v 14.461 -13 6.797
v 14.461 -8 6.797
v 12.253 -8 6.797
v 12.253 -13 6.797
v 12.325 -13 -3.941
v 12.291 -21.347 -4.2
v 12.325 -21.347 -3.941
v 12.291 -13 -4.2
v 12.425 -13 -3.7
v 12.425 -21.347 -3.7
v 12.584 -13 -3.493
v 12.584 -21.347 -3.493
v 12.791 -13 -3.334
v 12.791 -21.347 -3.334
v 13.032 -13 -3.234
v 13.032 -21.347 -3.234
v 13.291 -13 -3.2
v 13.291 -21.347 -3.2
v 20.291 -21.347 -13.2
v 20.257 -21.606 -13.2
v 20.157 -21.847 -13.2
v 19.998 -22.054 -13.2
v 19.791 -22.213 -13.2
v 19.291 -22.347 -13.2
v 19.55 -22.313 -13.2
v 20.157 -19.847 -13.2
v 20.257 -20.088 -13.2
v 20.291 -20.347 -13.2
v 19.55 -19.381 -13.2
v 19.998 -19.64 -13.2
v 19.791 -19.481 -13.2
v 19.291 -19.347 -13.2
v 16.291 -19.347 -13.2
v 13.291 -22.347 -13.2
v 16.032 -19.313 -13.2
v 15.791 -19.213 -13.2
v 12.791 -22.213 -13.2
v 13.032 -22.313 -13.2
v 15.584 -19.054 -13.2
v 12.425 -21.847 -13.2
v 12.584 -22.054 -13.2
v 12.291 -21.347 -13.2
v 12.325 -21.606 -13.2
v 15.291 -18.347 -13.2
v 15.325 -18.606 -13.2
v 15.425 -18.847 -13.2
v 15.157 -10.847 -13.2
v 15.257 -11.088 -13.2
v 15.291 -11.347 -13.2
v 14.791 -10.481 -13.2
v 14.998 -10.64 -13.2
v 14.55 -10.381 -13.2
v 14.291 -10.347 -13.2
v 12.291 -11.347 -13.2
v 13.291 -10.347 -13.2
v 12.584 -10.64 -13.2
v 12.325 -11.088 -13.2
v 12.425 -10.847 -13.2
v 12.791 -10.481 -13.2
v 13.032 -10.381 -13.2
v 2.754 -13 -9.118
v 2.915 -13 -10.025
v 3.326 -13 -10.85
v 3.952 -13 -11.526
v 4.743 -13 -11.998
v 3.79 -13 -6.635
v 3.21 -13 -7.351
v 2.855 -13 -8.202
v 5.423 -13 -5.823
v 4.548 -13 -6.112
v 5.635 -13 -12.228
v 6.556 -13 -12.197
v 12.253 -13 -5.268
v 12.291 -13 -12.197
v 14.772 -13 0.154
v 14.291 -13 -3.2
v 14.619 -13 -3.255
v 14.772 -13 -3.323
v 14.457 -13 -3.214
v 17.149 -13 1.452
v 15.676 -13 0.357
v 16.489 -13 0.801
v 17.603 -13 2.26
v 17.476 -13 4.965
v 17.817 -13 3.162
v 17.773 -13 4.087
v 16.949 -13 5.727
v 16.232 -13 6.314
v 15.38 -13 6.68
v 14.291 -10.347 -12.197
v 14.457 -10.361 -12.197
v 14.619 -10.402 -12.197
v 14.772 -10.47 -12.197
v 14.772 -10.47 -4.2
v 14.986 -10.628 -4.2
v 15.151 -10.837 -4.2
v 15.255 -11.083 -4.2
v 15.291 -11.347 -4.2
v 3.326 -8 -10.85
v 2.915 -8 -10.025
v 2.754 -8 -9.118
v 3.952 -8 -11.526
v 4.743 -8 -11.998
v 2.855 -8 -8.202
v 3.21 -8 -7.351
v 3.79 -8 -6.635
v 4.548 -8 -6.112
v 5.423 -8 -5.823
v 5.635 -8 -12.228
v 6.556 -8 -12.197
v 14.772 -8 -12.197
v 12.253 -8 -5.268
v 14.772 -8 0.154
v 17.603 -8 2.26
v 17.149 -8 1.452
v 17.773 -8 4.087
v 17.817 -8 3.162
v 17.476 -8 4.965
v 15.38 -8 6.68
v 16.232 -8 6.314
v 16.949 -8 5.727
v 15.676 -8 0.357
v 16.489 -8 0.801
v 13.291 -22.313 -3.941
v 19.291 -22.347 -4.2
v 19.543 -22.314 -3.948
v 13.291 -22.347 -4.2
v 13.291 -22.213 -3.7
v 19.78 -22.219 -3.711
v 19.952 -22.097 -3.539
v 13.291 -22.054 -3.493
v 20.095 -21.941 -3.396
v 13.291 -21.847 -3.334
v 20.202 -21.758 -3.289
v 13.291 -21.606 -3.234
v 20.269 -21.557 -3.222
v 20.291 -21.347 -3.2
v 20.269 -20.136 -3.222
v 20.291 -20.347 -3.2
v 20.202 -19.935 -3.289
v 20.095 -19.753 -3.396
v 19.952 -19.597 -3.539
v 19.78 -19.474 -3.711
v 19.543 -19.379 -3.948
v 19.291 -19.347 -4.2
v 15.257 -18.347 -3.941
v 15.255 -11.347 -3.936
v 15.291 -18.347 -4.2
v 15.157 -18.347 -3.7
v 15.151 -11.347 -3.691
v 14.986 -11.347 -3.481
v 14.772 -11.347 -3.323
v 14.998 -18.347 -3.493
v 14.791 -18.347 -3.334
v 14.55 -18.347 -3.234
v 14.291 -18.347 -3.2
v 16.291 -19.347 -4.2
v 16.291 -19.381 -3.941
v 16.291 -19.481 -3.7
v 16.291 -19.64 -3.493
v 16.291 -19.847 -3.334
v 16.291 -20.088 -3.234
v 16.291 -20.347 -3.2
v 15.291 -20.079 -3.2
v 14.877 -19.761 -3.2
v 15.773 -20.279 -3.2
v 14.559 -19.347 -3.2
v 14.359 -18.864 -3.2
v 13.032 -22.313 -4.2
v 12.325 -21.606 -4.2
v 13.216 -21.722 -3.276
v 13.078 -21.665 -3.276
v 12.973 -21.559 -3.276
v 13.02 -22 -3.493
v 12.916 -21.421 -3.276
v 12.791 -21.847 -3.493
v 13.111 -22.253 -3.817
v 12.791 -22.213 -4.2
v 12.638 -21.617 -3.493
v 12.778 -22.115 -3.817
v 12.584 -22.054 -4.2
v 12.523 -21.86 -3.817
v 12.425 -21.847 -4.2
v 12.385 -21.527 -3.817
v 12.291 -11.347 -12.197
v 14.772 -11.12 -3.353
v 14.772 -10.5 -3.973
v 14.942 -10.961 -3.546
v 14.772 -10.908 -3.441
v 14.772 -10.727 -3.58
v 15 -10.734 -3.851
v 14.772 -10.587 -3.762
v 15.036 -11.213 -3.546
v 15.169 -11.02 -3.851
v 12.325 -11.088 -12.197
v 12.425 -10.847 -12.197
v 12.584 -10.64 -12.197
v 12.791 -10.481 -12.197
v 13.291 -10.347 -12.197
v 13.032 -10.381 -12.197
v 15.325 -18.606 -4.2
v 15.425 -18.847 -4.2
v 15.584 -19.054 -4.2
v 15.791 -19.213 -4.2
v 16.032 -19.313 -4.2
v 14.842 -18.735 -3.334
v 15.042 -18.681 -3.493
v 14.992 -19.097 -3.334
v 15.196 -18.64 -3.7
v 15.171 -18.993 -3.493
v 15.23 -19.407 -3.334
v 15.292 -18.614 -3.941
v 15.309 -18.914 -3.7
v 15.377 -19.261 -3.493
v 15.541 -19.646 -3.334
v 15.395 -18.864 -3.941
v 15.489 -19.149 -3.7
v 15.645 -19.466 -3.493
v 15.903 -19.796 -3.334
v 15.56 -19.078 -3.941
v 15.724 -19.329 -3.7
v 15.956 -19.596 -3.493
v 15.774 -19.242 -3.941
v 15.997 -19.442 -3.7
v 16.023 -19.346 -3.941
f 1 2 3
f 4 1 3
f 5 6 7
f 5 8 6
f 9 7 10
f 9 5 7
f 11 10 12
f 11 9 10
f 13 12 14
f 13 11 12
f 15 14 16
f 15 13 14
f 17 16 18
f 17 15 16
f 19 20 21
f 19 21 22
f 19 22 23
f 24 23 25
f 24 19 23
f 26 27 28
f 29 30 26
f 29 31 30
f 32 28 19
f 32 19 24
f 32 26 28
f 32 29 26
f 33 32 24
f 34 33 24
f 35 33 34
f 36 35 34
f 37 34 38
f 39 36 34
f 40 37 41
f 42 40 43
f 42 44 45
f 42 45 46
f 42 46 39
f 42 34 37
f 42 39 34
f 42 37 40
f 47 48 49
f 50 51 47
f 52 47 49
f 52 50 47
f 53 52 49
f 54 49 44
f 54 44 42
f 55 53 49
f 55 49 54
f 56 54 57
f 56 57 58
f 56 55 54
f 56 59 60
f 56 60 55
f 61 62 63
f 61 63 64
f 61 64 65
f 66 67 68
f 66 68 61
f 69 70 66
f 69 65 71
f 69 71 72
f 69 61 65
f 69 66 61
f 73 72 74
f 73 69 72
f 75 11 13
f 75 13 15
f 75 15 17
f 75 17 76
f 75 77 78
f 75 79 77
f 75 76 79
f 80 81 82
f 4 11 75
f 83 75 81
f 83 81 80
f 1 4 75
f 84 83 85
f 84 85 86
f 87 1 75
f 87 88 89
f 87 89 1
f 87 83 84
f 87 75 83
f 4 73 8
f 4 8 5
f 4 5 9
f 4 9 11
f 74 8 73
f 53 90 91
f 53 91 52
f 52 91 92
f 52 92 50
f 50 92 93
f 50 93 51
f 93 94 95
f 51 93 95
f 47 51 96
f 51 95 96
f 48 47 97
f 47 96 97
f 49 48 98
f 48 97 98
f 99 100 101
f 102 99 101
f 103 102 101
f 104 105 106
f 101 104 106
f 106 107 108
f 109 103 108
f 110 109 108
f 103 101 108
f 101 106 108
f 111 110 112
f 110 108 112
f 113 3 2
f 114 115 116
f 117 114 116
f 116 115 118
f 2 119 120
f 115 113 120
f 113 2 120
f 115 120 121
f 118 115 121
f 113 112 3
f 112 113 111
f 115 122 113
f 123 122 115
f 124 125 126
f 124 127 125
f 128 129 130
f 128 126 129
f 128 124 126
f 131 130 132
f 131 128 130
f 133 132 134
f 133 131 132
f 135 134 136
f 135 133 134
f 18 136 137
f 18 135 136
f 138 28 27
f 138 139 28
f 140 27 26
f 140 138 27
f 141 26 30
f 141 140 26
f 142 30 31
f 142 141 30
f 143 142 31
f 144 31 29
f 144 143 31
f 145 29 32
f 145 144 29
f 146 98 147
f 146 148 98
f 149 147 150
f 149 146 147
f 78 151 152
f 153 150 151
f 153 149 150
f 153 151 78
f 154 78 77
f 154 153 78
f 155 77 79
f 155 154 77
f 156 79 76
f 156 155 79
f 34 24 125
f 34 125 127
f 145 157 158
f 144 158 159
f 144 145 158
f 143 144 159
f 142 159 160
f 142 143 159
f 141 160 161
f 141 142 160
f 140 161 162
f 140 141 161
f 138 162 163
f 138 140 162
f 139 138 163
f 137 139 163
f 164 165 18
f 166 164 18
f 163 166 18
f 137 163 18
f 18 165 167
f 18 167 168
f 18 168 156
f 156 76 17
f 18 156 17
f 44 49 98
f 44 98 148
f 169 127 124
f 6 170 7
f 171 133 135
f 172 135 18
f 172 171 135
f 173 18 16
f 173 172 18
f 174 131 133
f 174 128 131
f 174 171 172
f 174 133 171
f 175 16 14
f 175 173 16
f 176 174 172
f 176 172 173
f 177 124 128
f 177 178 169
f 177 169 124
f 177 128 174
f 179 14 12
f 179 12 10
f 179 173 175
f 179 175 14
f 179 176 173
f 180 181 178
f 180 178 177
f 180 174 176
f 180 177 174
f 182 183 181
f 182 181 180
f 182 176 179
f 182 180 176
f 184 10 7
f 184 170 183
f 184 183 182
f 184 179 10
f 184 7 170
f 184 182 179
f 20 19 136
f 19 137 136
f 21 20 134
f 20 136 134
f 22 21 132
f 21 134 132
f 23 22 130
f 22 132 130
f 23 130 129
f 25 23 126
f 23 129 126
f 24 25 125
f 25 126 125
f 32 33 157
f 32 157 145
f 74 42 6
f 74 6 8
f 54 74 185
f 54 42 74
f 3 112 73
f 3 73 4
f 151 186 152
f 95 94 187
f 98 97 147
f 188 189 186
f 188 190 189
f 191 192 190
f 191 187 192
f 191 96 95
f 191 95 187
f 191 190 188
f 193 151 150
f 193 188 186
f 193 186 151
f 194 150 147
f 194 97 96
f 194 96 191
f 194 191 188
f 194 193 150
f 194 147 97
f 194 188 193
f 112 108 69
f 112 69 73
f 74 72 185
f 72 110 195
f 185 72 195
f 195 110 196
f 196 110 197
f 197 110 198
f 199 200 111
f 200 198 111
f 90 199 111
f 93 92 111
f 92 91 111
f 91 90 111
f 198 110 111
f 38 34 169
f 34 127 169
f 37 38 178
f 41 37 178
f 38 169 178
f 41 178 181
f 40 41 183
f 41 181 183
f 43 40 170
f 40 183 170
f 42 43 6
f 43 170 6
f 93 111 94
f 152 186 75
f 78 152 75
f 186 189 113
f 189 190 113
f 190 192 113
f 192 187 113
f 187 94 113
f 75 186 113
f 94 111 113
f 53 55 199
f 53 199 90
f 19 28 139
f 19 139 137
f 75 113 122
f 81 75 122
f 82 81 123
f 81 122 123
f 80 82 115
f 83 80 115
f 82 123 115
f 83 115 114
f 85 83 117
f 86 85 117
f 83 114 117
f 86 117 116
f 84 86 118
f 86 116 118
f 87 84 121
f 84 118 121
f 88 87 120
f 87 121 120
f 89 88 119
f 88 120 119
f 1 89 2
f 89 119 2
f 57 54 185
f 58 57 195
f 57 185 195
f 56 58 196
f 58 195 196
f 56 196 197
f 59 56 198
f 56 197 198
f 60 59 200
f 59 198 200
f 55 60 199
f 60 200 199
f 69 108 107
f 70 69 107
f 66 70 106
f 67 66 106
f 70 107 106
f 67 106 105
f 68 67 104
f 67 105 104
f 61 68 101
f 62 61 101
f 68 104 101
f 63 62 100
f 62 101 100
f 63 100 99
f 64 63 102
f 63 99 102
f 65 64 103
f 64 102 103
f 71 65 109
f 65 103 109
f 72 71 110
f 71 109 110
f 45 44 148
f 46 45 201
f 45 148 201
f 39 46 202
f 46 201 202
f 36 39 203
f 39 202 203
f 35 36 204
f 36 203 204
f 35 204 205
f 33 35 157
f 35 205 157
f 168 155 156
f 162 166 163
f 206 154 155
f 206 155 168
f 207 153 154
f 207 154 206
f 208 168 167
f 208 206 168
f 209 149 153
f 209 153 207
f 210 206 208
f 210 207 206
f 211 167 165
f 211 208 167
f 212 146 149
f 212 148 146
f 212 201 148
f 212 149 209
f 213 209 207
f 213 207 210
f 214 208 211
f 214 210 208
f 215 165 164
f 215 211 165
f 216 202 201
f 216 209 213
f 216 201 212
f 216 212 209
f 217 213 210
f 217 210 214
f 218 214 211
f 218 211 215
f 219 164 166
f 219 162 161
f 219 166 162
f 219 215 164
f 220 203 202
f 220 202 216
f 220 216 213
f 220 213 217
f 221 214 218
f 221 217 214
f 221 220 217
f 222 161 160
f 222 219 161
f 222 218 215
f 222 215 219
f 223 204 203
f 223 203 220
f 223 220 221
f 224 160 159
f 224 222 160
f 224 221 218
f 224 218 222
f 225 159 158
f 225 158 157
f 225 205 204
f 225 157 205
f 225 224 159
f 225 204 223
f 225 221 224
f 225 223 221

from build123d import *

# Parameters (mm, degrees)
EXTRUDE004_DEPTH = 5
EXTRUDE003_DEPTH = 10
FILLET021_R      = 1


with BuildPart() as extrude004:
    # Sketch006 → Extrude004 (new body)
    with BuildSketch(Plane.XZ):
        with BuildLine():
            ThreePointArc((14.771842, 0.154152), (17.827348, 3.62591), (14.461083, 6.797264))
            Line((14.461083, 6.797264), (12.252875, 6.797264))
            Line((12.252875, -5.267611), (12.252875, 6.797264))
            Line((5.422805, -5.82309), (12.252875, -5.267611))
            ThreePointArc((5.422805, -5.82309), (2.802341, -9.576998), (6.556249, -12.197462))
            Line((6.556249, -12.197462), (14.771842, -12.197462))
            Line((14.771842, -12.197462), (14.771842, 0.154152))
        make_face()
    extrude(amount=EXTRUDE004_DEPTH)


with BuildPart() as extrude004_1:
    # Extrude004 placement: moved
    add(extrude004.part.moved(Location((0, -8, 0))))


with BuildPart() as fillet021:
    # Sketch005 → Extrude003 (new body)
    with BuildSketch(Plane.XY):
        Polygon((57.709053, -19.346786), (57.709053, -22.346786), (65.709053, -22.346786), (65.709053, -10.346786), (62.709053, -10.346786), (62.709053, -19.346786), align=None)
    extrude(amount=EXTRUDE003_DEPTH)


with BuildPart() as fillet021_1:
    # Extrude003 placement: moved
    add(fillet021.part.moved(Location((0, 0, -14))))

    # Fillet021
    fillet021_edges = [fillet021_1.edges().sort_by_distance(p)[0] for p in [
        (57.709053, -19.346786, -9),
        (57.709053, -22.346786, -9),
        (65.709053, -22.346786, -9),
        (61.709053, -22.346786, -4),
        (65.709053, -10.346786, -9),
        (65.709053, -16.346786, -4),
        (62.709053, -10.346786, -9),
        (64.209053, -10.346786, -4),
        (62.709053, -19.346786, -9),
        (62.709053, -14.846786, -4),
        (60.209053, -19.346786, -4),
    ]]
    fillet(fillet021_edges, radius=FILLET021_R)


with BuildPart() as fillet021_2:
    # Fillet021 placement: moved
    add(fillet021_1.part.moved(Location((0, 0, 0.4))))


with BuildPart() as c4holds002:
    # Part__Mirroring005: instance of Fillet021
    add(fillet021_2.part.mirror(Plane(origin=(0, 0, 0), x_dir=(0, -1, 0), z_dir=(1, 0, 0))))


with BuildPart() as c4holds002_1:
    # Part__Mirroring005 placement: moved
    add(c4holds002.part.moved(Location((78, 0, 0.4))))

    # Fusion040: union Extrude004
    add(extrude004_1.part)


solid = c4holds002_1.part
